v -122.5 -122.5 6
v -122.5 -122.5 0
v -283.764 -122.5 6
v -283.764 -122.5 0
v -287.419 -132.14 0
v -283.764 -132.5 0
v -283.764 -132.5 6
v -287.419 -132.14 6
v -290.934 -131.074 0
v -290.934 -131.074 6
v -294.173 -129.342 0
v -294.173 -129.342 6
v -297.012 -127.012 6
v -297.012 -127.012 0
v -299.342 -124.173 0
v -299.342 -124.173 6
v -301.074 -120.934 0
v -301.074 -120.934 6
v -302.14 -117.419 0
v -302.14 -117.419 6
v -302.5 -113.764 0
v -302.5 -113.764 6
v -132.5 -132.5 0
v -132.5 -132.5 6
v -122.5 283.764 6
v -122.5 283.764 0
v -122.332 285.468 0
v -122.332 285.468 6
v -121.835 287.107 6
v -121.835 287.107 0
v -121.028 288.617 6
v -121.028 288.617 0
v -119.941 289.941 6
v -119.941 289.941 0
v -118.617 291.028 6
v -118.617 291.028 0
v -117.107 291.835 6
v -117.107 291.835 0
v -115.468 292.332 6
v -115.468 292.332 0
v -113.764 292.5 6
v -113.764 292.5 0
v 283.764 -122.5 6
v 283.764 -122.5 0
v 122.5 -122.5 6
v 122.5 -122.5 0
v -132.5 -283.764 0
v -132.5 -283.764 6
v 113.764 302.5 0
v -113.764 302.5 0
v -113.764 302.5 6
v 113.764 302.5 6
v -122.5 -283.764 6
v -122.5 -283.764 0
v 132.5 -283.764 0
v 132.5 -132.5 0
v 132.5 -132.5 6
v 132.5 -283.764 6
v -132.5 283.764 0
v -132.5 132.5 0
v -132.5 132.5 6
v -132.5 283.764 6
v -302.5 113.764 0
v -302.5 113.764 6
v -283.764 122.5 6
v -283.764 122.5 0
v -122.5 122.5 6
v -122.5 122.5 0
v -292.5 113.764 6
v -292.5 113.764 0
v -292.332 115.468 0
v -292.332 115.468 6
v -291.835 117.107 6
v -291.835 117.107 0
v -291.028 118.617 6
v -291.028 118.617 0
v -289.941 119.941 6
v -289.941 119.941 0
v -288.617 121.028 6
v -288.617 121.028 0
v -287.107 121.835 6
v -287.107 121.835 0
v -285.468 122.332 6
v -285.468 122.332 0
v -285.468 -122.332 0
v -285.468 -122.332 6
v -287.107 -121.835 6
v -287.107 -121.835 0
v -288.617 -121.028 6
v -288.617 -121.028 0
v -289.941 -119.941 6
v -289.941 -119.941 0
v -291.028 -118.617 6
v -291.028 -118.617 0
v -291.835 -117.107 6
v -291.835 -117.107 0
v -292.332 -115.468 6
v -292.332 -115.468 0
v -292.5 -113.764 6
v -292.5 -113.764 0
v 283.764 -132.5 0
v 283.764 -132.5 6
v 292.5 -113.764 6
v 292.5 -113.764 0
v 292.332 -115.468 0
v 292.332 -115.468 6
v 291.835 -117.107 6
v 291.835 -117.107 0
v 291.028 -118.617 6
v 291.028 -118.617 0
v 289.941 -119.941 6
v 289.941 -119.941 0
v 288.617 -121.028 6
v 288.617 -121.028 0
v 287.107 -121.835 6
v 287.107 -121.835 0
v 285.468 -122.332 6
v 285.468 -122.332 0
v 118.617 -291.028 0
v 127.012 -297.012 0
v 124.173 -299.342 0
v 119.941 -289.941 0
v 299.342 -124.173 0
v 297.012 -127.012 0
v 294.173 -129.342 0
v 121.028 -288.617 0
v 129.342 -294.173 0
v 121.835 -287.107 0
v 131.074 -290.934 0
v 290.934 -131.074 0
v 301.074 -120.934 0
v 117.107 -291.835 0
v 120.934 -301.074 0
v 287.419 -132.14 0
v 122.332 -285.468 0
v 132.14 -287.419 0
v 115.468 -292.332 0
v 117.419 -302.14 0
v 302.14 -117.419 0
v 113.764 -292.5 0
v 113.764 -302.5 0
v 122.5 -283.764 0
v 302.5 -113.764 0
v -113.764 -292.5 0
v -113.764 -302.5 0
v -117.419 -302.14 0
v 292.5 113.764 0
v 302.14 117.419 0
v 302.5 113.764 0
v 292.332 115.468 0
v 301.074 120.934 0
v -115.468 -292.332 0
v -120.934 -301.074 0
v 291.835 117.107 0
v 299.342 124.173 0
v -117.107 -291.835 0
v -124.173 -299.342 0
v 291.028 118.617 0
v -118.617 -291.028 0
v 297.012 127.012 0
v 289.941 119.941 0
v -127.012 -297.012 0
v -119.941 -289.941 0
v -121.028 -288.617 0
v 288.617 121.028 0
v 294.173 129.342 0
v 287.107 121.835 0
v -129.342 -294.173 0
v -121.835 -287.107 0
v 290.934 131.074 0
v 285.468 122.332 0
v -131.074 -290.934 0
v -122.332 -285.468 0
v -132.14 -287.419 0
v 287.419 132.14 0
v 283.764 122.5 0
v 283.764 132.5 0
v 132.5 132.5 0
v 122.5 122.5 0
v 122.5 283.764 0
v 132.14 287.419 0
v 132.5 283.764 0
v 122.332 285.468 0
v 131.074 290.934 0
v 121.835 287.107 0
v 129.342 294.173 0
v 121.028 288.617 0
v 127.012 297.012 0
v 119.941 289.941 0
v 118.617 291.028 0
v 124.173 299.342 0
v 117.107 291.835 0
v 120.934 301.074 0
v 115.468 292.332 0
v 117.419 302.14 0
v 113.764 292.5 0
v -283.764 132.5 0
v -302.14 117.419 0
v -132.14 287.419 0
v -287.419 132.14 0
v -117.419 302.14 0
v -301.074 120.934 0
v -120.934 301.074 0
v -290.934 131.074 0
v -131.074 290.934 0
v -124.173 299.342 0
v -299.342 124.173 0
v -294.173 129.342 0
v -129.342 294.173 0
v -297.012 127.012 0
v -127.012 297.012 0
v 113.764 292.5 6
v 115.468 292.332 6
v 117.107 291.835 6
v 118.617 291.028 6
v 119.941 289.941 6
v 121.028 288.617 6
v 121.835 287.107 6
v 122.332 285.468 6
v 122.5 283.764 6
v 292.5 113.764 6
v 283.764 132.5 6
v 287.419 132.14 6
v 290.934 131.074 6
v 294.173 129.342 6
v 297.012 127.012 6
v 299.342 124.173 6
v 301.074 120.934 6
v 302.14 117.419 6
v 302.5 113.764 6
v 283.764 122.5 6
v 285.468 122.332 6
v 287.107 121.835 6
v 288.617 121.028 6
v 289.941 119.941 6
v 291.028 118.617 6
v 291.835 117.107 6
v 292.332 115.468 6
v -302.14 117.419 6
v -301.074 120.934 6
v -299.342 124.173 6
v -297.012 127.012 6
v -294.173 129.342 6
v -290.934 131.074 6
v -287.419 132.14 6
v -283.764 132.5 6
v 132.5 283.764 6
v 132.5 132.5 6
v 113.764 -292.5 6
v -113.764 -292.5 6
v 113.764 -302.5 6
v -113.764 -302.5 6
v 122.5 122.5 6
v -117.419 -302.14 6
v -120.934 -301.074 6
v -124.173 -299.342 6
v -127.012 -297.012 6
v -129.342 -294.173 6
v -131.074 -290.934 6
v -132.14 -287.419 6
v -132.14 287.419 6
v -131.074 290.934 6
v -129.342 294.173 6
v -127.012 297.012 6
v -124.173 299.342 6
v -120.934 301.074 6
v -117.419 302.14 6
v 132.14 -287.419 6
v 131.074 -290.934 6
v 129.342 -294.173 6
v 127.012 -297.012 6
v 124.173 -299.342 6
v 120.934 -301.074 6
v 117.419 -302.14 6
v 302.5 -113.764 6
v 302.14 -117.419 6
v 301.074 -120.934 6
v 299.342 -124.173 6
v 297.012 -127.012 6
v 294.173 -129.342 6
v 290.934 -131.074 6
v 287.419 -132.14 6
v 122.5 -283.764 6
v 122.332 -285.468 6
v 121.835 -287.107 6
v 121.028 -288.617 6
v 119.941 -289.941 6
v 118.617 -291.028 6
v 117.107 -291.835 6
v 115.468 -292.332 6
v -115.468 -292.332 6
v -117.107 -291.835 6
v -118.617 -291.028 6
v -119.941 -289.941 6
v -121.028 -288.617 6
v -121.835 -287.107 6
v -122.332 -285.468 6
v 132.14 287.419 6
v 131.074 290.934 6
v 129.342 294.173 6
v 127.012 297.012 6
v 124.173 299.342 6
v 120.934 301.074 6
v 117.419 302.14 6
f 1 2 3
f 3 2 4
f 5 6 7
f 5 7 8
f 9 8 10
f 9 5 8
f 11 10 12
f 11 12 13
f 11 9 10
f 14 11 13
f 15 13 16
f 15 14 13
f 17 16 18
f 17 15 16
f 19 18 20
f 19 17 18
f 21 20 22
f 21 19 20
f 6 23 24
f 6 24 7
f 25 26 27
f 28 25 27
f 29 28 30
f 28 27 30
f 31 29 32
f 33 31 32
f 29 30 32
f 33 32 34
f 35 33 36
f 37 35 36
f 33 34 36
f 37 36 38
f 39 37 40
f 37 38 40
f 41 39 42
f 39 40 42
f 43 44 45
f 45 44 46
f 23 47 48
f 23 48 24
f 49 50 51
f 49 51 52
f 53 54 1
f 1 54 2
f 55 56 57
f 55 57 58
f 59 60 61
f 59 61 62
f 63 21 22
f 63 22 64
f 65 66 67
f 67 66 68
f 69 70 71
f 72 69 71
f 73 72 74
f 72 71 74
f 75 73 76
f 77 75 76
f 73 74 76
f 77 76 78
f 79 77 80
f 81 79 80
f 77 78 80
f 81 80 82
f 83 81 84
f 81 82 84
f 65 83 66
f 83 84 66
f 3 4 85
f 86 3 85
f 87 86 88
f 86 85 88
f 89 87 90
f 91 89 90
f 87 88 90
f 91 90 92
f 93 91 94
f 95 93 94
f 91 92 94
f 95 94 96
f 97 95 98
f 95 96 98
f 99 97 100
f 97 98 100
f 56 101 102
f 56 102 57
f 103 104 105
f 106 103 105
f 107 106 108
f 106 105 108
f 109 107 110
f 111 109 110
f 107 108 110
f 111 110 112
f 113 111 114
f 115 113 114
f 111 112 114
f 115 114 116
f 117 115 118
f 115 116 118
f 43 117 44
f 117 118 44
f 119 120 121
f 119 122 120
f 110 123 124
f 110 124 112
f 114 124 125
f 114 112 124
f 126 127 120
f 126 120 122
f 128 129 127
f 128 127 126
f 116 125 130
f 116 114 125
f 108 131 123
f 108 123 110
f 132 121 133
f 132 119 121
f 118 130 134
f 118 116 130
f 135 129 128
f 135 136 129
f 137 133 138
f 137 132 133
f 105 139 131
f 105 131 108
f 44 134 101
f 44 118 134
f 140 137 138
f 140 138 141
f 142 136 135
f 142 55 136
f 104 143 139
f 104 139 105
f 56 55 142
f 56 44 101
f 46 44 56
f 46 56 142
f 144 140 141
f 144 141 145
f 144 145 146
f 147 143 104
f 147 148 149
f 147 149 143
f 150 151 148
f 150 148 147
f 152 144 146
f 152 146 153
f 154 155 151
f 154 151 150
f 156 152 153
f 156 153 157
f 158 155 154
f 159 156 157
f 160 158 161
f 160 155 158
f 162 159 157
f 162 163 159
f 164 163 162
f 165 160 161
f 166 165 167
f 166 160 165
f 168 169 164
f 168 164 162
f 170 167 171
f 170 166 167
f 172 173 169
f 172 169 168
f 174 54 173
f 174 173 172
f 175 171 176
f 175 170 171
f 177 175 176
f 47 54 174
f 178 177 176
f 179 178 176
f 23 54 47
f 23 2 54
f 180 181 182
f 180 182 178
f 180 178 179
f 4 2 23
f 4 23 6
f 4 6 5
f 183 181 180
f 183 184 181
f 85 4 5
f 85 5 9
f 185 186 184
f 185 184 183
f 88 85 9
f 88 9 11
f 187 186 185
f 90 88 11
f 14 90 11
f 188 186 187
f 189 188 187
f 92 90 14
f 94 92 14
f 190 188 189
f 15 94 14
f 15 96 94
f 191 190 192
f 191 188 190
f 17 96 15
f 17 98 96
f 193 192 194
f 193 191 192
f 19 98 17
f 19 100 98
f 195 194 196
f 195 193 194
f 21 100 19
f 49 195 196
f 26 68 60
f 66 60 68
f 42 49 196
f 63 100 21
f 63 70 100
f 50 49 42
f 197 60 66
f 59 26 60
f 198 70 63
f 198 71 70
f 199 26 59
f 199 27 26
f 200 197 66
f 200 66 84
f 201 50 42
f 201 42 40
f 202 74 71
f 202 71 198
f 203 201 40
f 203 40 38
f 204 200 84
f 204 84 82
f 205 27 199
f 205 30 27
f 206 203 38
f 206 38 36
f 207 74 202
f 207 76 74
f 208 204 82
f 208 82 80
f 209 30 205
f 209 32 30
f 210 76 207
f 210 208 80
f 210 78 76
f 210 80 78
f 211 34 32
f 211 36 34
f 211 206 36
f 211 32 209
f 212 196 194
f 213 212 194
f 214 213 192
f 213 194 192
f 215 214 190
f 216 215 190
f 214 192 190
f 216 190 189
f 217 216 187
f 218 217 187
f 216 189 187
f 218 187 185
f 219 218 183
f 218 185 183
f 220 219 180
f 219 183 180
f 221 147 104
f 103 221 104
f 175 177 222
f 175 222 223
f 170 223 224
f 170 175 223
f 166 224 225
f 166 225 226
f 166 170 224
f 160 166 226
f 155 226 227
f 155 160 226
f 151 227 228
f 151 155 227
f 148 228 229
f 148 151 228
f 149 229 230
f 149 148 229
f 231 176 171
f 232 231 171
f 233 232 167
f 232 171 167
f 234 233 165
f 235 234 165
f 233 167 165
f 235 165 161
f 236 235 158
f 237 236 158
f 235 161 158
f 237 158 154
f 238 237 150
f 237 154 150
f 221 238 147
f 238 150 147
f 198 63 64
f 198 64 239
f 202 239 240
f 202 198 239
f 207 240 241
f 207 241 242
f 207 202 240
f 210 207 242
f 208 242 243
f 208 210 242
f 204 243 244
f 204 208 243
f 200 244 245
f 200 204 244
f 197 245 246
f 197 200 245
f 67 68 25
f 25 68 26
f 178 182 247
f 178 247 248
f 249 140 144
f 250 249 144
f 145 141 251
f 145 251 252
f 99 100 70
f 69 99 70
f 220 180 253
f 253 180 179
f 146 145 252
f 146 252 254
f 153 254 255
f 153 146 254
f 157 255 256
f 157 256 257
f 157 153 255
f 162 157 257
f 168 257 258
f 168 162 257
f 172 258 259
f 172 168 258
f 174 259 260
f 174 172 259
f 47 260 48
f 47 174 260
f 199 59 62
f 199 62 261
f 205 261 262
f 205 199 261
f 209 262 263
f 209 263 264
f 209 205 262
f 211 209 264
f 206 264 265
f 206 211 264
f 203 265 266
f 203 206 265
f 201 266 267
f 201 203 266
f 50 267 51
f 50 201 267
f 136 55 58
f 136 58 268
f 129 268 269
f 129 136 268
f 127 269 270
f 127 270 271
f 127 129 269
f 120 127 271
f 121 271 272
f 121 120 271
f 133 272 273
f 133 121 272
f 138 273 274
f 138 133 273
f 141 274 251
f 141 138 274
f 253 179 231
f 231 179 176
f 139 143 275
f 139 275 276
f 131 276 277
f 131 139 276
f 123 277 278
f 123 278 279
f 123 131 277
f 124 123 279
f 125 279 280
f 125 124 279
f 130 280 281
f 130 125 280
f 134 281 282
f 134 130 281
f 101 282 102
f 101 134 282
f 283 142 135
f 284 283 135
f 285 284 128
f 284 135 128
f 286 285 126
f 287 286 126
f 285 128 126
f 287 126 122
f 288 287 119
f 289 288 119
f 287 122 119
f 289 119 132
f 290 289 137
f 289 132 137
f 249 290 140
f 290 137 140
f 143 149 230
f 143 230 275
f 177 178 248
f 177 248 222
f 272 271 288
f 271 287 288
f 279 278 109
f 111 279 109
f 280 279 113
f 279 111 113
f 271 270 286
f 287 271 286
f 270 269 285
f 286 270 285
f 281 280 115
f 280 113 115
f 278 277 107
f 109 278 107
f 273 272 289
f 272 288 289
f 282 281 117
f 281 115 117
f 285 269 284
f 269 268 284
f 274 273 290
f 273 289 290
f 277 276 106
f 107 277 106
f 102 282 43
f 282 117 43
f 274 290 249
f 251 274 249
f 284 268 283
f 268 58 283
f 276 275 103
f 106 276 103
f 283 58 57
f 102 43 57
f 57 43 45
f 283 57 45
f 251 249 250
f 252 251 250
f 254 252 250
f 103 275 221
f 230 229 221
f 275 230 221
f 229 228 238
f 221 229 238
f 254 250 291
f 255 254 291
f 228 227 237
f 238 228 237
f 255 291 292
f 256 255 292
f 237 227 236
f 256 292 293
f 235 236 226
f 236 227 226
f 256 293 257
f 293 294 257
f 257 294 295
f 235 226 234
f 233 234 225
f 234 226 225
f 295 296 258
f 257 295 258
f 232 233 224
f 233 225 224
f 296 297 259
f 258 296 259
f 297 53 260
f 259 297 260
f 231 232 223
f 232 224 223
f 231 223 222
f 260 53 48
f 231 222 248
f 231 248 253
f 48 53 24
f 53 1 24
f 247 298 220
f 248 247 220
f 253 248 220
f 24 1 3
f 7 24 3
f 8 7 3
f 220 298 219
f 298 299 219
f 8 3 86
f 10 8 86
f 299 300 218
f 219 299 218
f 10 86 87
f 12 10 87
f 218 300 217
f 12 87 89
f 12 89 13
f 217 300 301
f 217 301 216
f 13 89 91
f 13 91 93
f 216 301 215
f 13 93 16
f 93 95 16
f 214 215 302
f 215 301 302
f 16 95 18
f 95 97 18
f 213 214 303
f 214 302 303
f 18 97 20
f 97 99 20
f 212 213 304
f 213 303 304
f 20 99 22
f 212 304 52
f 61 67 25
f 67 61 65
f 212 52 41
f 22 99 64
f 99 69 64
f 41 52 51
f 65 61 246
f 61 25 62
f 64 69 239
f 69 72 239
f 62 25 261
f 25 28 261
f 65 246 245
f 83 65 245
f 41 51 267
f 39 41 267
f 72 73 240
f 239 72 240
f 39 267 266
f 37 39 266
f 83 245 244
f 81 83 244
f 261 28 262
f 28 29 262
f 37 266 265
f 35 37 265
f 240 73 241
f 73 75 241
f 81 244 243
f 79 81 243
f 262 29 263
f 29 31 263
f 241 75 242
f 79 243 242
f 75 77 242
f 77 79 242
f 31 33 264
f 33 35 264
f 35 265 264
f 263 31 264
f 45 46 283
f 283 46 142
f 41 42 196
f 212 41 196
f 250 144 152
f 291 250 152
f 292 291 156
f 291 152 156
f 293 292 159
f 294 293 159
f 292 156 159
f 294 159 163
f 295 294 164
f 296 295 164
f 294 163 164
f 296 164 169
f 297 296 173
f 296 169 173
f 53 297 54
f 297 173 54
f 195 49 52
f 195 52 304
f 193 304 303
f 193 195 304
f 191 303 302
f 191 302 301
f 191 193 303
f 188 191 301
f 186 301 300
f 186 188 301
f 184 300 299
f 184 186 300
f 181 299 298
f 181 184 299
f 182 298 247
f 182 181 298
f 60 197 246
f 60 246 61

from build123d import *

# Parameters (mm, degrees)
SALIENTE_EXTRUIR1_DEPTH = 6


with BuildPart() as part:
    # Croquis1 → Saliente-Extruir1 (new body)
    with BuildSketch(Plane.XY):
        with BuildLine():
            Line((-283.764, 132.5), (-132.5, 132.5))
            Line((-132.5, 132.5), (-132.5, 283.764))
            ThreePointArc((-132.5, 283.764), (-127.012352652, 297.012352652), (-113.764, 302.5))
            Line((-113.764, 302.5), (113.764, 302.5))
            ThreePointArc((113.764, 302.5), (127.012352652, 297.012352652), (132.5, 283.764))
            Line((132.5, 283.764), (132.5, 132.5))
            Line((132.5, 132.5), (283.764, 132.5))
            ThreePointArc((283.764, 132.5), (297.012352652, 127.012352652), (302.5, 113.764))
            Line((302.5, 113.764), (302.5, -113.764))
            ThreePointArc((302.5, -113.764), (297.012352652, -127.012352652), (283.764, -132.5))
            Line((283.764, -132.5), (132.5, -132.5))
            Line((132.5, -132.5), (132.5, -283.764))
            ThreePointArc((132.5, -283.764), (127.012352652, -297.012352652), (113.764, -302.5))
            Line((113.764, -302.5), (-113.764, -302.5))
            ThreePointArc((-113.764, -302.5), (-127.012352652, -297.012352652), (-132.5, -283.764))
            Line((-132.5, -283.764), (-132.5, -132.5))
            Line((-132.5, -132.5), (-283.764, -132.5))
            ThreePointArc((-283.764, -132.5), (-297.012352652, -127.012352652), (-302.5, -113.764))
            Line((-302.5, -113.764), (-302.5, 113.764))
            ThreePointArc((-302.5, 113.764), (-297.012352652, 127.012352652), (-283.764, 132.5))
        make_face()
        with BuildLine():
            Line((-283.764, 122.5), (-122.5, 122.5))
            Line((-122.5, 122.5), (-122.5, 283.764))
            ThreePointArc((-122.5, 283.764), (-119.94128484, 289.94128484), (-113.764, 292.5))
            Line((-113.764, 292.5), (113.764, 292.5))
            ThreePointArc((113.764, 292.5), (119.94128484, 289.94128484), (122.5, 283.764))
            Line((122.5, 283.764), (122.5, 122.5))
            Line((122.5, 122.5), (283.764, 122.5))
            ThreePointArc((283.764, 122.5), (289.94128484, 119.94128484), (292.5, 113.764))
            Line((292.5, 113.764), (292.5, -113.764))
            ThreePointArc((292.5, -113.764), (289.94128484, -119.94128484), (283.764, -122.5))
            Line((283.764, -122.5), (122.5, -122.5))
            Line((122.5, -122.5), (122.5, -283.764))
            ThreePointArc((122.5, -283.764), (119.94128484, -289.94128484), (113.764, -292.5))
            Line((113.764, -292.5), (-113.764, -292.5))
            ThreePointArc((-113.764, -292.5), (-119.94128484, -289.94128484), (-122.5, -283.764))
            Line((-122.5, -283.764), (-122.5, -122.5))
            Line((-122.5, -122.5), (-283.764, -122.5))
            ThreePointArc((-283.764, -122.5), (-289.94128484, -119.94128484), (-292.5, -113.764))
            Line((-292.5, -113.764), (-292.5, 113.764))
            ThreePointArc((-292.5, 113.764), (-289.94128484, 119.94128484), (-283.764, 122.5))
        make_face(mode=Mode.SUBTRACT)
    extrude(amount=SALIENTE_EXTRUIR1_DEPTH)


solid = part.part
